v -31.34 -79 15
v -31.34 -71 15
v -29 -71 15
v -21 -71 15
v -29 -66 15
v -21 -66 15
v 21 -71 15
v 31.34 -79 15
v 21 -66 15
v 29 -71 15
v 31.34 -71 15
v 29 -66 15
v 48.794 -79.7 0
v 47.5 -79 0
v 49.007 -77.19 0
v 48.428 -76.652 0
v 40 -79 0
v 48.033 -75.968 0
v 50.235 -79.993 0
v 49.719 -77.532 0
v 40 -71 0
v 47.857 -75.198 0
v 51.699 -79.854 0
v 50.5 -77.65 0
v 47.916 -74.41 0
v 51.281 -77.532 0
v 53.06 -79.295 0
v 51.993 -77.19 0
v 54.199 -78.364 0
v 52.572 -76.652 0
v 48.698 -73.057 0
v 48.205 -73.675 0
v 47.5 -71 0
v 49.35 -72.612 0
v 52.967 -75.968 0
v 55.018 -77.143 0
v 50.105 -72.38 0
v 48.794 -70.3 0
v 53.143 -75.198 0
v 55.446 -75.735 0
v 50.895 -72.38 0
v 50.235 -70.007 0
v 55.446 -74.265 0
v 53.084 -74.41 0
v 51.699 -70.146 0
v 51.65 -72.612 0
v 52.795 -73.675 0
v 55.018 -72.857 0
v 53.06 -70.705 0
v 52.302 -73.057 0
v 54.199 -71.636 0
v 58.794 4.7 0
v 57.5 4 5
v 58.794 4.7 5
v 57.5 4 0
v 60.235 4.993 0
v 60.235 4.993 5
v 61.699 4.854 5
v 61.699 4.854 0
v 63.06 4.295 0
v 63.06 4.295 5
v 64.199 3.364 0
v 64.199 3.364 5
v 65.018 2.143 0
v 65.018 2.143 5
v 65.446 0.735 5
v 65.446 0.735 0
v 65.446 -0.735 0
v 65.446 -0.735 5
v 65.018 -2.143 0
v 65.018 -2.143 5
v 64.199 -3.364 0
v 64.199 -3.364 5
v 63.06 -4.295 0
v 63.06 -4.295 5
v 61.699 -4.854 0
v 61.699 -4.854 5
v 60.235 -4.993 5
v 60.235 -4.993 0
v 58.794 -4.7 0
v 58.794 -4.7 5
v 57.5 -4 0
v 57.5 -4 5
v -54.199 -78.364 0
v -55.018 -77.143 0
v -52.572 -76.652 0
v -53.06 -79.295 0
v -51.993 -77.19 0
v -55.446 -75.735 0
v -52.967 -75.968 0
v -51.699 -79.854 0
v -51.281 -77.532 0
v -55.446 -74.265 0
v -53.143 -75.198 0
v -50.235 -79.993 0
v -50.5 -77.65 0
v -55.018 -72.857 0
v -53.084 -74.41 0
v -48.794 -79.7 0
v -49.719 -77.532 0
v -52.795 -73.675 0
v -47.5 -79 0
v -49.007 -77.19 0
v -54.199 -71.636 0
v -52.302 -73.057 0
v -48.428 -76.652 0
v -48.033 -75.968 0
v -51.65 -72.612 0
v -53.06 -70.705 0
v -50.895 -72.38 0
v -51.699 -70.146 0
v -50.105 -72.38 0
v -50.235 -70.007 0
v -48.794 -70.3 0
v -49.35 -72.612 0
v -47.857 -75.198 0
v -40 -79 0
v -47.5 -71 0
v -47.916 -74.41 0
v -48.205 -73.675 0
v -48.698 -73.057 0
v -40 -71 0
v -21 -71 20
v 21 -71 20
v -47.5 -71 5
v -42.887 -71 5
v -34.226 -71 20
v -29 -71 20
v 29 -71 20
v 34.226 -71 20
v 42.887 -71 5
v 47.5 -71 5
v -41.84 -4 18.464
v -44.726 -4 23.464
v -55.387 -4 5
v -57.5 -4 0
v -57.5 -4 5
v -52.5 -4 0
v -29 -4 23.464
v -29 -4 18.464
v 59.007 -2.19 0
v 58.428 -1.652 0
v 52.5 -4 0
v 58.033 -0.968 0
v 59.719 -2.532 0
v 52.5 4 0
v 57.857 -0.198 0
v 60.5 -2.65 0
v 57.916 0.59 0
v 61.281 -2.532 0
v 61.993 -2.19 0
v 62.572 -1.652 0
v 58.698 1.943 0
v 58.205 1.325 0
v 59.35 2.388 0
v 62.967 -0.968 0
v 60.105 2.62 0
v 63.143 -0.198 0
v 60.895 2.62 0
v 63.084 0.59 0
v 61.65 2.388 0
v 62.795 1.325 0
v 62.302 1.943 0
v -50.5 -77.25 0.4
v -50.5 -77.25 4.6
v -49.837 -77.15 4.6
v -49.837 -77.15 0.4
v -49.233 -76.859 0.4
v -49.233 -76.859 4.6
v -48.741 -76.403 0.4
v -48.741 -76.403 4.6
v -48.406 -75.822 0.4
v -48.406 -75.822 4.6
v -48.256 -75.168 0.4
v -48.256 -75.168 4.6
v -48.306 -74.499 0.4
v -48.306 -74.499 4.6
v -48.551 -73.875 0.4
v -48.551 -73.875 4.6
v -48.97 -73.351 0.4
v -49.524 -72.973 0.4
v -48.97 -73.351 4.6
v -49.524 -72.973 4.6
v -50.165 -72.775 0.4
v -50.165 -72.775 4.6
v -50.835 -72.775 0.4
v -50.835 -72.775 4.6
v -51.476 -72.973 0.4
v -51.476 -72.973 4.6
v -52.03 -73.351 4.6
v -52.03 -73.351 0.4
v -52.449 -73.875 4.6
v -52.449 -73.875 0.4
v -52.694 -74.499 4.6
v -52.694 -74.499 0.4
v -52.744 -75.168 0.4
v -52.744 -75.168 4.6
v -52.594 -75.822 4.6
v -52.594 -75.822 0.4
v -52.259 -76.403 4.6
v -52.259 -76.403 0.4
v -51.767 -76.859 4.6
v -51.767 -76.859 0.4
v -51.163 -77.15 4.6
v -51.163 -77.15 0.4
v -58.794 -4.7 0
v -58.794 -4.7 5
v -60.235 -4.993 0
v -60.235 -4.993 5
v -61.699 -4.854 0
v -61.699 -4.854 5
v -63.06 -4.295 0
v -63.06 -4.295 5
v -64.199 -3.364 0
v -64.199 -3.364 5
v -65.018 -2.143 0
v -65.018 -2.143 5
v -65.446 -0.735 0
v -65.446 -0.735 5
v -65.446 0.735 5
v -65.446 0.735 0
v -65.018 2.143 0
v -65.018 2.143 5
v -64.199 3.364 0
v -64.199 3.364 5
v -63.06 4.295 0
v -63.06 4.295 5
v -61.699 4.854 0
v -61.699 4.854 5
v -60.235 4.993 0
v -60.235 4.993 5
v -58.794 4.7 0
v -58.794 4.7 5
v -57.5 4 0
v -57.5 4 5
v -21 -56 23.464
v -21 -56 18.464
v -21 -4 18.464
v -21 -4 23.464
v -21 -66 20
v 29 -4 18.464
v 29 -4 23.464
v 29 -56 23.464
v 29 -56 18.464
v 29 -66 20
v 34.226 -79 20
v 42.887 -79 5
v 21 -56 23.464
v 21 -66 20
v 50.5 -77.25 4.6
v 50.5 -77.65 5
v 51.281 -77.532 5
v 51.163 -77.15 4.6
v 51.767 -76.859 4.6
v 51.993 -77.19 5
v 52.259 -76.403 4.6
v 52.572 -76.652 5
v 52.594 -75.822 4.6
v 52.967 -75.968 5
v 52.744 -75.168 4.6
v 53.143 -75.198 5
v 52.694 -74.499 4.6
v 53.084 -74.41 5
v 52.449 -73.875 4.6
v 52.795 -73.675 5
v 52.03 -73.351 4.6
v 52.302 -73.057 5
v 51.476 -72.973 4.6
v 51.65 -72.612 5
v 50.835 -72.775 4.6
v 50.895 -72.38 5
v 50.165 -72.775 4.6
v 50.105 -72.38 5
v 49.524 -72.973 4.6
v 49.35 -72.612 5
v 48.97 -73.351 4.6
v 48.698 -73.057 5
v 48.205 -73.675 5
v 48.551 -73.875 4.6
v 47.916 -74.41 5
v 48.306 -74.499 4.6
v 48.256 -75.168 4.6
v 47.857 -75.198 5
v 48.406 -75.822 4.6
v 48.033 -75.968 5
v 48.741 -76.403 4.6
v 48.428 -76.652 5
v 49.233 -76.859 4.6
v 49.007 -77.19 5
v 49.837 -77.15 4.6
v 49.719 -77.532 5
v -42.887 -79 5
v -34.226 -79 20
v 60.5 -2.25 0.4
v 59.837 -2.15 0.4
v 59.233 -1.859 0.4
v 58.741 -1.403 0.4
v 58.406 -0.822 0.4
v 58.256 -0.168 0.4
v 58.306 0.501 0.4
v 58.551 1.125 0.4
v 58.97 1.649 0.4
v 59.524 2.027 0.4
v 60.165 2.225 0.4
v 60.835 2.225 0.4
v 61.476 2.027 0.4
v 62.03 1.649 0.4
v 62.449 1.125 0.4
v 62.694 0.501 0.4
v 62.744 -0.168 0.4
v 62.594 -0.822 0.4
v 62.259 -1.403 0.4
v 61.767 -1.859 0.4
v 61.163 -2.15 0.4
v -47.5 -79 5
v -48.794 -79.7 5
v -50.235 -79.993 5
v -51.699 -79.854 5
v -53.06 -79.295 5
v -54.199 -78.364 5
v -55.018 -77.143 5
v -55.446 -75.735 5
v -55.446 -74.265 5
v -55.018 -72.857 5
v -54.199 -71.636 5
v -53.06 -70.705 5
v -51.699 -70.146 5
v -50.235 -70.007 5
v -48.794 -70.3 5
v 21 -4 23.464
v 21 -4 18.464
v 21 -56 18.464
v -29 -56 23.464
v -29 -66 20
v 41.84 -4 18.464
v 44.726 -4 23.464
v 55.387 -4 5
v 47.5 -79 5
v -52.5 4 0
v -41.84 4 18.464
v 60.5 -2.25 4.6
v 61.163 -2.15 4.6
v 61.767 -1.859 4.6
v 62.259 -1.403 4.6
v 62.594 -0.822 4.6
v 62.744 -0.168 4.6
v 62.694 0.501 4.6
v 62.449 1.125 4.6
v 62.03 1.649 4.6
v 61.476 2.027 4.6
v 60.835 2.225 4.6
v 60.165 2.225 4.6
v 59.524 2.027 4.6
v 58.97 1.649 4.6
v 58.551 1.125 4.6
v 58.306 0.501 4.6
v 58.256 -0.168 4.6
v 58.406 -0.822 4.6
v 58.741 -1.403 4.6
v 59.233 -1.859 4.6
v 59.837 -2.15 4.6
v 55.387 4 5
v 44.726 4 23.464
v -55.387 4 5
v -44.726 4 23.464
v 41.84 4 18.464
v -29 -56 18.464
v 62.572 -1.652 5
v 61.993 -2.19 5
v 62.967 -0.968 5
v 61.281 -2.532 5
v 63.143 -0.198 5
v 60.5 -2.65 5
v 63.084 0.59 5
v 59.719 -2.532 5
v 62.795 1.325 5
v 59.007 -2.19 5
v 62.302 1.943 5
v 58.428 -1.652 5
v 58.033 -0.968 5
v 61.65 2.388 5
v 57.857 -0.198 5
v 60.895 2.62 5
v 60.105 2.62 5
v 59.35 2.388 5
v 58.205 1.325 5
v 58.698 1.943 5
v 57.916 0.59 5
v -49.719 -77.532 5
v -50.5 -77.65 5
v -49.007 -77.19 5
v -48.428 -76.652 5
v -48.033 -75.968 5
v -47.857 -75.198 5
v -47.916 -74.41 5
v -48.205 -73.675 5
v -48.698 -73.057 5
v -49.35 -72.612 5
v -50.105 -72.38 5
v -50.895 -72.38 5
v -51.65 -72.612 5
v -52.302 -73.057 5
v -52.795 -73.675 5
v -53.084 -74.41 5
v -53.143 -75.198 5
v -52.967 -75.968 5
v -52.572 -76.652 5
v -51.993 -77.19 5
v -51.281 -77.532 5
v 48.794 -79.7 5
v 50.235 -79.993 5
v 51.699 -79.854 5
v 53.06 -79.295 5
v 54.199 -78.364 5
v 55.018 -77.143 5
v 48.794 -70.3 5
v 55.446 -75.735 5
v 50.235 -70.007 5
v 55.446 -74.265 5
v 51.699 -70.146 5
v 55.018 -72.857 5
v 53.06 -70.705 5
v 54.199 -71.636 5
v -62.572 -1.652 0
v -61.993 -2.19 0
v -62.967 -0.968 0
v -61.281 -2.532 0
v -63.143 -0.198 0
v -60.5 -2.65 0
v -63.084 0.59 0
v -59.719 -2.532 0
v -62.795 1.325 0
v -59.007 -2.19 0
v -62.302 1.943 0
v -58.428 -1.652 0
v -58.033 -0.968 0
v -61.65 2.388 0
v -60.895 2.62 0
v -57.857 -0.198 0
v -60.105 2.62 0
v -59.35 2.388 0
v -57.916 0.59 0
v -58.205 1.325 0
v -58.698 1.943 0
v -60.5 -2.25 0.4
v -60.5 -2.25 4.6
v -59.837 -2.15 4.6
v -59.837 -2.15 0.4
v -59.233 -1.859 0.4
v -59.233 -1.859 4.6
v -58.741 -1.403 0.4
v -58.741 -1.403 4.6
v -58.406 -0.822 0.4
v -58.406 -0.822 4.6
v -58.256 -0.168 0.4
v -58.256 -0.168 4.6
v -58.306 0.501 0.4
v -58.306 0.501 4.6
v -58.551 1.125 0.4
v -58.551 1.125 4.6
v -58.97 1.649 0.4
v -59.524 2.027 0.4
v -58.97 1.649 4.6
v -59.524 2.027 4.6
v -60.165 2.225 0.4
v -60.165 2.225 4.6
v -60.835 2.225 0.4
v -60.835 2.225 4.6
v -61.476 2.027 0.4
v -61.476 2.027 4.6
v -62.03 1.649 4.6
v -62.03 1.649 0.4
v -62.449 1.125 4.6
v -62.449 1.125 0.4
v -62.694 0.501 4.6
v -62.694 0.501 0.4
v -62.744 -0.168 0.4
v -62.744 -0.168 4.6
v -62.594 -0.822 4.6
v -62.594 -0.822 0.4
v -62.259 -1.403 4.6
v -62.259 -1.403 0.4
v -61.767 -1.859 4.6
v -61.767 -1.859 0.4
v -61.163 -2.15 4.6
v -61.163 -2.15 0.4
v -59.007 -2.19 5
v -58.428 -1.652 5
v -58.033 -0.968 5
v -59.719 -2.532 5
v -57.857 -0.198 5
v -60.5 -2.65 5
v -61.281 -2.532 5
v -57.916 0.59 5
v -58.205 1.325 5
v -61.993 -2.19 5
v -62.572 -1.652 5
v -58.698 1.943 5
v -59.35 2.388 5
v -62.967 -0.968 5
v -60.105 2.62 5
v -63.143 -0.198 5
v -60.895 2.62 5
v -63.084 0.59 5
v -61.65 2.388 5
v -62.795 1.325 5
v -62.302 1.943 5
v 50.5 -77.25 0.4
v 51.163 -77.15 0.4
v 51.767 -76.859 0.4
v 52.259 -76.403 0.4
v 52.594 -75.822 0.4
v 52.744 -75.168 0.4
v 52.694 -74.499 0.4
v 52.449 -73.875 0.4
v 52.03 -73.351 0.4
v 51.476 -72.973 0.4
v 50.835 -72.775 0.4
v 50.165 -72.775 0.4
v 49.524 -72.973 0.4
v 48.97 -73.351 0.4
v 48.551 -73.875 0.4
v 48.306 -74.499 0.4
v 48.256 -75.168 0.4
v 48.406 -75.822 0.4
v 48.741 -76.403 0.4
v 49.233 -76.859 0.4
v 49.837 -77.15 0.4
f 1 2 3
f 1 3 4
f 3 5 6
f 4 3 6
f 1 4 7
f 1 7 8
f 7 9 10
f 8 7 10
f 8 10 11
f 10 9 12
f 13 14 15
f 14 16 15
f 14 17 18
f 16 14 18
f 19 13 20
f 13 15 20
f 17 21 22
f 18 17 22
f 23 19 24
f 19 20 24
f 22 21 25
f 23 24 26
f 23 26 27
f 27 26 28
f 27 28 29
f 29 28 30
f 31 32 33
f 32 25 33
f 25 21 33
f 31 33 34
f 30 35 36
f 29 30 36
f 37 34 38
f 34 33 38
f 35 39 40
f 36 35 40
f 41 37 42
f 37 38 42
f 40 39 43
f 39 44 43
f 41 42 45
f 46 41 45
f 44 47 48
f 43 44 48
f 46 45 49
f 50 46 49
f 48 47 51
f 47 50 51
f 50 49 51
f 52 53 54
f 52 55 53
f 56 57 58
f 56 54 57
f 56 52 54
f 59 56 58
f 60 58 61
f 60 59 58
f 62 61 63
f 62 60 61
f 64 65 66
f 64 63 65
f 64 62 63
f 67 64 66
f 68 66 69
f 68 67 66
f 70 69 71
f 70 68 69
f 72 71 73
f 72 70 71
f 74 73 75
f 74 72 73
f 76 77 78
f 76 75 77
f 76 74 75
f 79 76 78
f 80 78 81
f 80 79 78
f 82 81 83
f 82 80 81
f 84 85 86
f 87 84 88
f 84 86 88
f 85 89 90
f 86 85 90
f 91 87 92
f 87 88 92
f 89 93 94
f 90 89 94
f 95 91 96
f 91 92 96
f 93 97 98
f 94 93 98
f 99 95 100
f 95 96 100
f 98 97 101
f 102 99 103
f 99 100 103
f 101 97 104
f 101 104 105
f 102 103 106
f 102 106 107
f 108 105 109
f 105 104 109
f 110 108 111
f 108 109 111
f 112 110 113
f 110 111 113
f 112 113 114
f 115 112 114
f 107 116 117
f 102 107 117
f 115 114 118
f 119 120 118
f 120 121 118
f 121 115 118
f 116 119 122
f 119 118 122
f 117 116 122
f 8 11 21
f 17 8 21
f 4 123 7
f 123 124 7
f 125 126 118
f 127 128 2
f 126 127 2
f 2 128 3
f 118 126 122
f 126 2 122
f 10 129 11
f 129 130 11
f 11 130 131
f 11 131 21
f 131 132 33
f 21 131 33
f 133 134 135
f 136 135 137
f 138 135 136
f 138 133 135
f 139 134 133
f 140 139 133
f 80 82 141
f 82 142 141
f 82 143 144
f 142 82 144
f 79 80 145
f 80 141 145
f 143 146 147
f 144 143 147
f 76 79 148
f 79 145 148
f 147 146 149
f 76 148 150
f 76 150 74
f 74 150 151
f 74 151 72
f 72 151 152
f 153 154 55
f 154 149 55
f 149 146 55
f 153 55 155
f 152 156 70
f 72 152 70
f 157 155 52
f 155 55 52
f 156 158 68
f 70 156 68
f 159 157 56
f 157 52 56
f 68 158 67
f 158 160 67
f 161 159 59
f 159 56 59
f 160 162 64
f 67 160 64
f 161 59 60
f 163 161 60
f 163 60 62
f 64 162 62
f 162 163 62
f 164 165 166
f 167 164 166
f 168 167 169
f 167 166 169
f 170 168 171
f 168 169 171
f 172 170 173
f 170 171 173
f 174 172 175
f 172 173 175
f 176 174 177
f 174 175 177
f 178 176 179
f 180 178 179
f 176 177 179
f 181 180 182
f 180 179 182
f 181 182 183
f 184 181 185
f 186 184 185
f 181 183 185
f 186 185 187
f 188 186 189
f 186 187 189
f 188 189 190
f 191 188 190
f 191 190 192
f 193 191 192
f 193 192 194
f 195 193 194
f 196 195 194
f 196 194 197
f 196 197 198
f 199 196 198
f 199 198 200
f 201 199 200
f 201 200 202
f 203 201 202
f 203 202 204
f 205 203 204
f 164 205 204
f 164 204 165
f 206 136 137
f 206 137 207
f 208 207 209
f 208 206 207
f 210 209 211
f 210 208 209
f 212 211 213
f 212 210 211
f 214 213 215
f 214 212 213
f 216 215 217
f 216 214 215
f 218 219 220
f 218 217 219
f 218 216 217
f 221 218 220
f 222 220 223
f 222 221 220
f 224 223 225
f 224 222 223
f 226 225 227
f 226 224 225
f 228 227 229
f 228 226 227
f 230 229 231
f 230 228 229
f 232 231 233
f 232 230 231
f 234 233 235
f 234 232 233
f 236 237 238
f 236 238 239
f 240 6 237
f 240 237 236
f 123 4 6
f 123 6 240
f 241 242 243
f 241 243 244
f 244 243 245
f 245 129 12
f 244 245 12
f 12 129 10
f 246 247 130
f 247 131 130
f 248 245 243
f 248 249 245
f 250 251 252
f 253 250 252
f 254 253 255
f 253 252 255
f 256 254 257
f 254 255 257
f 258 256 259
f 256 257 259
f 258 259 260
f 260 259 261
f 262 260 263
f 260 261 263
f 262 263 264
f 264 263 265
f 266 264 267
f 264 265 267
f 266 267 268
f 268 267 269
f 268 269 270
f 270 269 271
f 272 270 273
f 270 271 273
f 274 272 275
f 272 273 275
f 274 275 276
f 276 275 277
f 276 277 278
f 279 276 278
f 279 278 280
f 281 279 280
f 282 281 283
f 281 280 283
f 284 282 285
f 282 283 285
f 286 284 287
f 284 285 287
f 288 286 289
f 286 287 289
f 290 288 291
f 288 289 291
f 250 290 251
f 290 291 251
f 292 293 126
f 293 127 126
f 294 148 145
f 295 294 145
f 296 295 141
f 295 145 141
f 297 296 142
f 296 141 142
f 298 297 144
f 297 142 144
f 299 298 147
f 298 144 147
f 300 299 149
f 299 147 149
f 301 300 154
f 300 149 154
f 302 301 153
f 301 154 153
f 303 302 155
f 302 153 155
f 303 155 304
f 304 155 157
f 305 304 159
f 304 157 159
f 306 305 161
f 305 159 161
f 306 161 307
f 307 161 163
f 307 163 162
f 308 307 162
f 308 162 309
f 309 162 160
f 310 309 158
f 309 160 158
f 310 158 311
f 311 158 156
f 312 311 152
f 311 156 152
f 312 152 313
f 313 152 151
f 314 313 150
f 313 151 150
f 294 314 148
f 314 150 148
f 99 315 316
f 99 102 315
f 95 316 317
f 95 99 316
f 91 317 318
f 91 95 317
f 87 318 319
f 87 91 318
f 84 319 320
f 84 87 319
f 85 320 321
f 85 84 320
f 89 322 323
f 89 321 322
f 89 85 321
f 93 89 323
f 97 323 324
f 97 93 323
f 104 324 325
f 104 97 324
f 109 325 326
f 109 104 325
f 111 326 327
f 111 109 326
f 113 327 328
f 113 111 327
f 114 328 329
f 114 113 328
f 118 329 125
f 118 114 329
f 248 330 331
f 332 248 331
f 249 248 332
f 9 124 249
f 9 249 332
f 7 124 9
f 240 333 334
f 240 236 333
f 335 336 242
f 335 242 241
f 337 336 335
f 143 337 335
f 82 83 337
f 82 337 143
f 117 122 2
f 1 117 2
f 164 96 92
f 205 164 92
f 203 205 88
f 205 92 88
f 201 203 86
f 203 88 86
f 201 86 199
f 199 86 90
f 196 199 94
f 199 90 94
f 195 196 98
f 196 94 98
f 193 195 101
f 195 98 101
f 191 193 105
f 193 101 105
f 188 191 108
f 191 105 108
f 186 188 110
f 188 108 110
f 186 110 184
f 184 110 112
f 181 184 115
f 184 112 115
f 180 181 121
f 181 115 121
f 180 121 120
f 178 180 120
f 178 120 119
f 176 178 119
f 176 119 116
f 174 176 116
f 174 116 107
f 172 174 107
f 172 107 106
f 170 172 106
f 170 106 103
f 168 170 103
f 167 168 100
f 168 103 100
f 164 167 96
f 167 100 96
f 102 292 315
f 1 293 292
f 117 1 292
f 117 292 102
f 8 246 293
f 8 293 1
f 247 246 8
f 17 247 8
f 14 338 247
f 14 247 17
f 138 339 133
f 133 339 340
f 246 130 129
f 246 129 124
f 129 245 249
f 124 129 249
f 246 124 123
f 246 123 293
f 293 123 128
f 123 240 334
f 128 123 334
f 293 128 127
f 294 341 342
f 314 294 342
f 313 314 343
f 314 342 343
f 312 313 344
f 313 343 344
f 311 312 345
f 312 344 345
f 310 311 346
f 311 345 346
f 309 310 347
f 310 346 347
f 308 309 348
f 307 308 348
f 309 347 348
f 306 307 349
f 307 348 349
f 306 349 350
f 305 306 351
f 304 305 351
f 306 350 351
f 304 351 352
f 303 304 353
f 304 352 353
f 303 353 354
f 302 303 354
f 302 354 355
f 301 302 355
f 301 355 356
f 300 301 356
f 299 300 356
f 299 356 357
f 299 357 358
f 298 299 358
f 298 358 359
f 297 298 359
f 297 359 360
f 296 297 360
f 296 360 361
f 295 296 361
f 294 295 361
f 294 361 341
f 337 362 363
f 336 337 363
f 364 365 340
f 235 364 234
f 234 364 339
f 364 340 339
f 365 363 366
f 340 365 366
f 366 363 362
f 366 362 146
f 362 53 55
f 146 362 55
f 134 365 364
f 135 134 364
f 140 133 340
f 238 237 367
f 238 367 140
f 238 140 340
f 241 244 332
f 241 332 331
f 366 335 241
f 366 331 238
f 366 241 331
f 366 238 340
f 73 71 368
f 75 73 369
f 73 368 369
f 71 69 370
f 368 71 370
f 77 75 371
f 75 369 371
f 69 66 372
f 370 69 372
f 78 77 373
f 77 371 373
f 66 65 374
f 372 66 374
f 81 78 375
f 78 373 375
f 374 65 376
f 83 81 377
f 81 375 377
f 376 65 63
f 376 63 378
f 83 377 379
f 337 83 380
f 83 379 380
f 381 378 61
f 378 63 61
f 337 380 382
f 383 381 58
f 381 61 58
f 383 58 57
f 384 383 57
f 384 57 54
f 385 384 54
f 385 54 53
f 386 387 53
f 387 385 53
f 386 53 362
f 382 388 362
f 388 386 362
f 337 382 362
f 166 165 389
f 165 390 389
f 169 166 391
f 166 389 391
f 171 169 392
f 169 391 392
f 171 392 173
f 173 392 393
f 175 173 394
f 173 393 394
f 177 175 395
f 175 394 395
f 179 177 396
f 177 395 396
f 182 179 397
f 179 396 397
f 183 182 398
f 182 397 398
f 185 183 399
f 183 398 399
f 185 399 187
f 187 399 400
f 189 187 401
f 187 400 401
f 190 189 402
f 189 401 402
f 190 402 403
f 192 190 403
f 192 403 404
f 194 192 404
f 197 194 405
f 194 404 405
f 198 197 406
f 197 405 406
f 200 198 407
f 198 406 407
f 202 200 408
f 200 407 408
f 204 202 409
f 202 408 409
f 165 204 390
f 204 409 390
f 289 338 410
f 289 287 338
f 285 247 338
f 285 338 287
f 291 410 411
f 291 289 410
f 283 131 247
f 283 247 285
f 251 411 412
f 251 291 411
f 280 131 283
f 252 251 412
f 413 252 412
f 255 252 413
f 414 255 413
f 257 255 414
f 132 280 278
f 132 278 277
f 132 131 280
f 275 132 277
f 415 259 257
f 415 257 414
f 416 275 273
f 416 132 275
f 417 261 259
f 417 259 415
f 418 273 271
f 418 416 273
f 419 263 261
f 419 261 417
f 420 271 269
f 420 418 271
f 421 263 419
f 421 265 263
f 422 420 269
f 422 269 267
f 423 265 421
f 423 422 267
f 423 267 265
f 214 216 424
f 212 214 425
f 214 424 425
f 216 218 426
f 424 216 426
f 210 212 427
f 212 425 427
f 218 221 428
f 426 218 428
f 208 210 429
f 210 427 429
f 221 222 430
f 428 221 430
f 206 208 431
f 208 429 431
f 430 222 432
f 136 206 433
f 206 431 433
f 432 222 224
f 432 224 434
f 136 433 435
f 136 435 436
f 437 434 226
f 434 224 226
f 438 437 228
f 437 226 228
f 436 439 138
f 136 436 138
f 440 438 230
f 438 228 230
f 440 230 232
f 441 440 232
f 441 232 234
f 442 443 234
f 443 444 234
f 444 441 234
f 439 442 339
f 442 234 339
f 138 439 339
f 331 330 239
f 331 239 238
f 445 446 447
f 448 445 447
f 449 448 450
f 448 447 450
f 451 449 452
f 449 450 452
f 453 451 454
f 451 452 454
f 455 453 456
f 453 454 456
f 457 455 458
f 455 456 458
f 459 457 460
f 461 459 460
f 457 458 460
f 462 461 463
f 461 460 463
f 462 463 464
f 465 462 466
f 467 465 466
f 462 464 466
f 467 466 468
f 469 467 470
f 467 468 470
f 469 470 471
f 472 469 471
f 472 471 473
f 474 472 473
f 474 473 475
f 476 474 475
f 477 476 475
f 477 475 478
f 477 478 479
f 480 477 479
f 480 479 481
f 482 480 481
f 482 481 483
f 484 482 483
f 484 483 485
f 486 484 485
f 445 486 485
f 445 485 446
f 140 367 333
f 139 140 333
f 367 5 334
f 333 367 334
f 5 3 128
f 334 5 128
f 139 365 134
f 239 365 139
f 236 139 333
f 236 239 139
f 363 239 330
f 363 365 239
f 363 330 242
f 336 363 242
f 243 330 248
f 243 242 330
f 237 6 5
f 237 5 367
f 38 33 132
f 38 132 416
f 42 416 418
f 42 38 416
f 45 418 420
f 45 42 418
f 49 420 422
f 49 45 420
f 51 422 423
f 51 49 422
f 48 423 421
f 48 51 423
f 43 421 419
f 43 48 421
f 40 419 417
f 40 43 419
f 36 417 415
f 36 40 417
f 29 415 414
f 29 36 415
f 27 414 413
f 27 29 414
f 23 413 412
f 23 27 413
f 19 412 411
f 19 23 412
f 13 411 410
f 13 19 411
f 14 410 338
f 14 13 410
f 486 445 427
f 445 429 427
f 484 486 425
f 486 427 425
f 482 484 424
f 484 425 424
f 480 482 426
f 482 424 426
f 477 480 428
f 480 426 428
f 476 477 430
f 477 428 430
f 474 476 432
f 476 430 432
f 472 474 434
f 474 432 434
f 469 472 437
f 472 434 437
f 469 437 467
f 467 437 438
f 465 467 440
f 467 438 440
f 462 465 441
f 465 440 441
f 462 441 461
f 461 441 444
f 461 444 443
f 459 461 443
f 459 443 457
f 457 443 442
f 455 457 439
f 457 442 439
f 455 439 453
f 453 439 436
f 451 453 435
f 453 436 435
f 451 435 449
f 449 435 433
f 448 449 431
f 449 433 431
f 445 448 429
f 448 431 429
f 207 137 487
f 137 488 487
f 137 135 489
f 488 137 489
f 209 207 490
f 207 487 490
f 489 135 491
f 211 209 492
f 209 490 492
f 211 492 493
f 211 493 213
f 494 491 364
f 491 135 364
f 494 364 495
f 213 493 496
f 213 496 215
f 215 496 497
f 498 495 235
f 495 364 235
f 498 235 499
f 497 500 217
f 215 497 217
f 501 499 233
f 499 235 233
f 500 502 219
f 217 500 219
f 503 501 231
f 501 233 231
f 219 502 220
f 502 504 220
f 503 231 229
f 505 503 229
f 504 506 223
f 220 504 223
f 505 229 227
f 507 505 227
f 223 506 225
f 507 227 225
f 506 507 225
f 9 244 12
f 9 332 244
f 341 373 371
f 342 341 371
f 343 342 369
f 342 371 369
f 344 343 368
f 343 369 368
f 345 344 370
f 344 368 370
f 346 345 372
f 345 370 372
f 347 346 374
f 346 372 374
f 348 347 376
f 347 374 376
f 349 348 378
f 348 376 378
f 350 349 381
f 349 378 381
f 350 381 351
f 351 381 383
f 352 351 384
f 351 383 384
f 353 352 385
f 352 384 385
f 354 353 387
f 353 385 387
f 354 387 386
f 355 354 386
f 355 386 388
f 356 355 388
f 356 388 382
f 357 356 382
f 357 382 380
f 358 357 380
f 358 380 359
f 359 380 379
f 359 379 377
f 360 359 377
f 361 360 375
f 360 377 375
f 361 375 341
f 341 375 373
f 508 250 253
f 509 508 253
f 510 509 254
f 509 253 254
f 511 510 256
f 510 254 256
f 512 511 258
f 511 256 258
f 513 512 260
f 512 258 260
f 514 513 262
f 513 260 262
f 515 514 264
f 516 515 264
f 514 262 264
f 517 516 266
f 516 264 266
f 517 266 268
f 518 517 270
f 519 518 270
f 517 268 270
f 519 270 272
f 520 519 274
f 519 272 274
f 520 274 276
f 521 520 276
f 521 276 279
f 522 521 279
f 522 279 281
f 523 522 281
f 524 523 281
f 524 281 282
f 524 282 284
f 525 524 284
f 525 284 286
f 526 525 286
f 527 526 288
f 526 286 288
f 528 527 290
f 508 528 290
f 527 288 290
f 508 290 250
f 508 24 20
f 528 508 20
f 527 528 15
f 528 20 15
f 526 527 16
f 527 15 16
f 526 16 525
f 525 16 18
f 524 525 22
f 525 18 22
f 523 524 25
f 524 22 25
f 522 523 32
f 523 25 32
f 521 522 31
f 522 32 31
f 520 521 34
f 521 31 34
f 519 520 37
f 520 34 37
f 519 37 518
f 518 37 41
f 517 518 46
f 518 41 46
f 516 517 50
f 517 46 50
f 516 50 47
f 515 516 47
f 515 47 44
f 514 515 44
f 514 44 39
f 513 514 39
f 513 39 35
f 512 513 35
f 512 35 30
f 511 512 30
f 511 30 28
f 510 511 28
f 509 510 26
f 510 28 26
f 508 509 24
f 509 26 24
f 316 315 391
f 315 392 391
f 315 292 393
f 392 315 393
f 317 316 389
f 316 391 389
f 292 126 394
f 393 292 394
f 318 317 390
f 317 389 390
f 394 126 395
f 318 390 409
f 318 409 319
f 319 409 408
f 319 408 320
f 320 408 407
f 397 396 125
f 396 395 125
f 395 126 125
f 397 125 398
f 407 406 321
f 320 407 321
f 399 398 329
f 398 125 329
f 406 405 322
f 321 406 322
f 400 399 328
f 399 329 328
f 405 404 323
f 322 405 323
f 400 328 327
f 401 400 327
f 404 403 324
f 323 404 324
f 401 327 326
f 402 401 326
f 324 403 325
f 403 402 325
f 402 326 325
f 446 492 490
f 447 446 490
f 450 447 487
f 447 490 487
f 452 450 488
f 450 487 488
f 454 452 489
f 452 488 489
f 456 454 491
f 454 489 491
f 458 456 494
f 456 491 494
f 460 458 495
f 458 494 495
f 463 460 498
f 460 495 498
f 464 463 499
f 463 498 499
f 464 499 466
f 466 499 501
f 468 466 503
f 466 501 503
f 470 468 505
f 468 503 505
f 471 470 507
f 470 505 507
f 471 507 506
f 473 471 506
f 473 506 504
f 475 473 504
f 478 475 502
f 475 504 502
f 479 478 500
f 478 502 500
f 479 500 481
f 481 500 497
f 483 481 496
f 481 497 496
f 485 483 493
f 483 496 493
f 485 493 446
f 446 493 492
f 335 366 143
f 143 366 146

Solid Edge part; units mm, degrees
sketch "Sketch1" plane through (0, 0, 0) normal (0, 0, 1) x (1, 0, 0)
  circle A0 centre (-60.5, 0) radius 5
  circle A1 centre (60.5, 0) radius 5
  circle A2 centre (50.5, -75) radius 5
  circle A3 centre (-50.5, -75) radius 5
  dimension "D1" = 10
  dimension "D2" = 10
extrude "Protrusion1" add sketch "Sketch1" along normal blind 5
sketch "Sketch2" plane through (0, 0, 0) normal (0, -1, 0) x (1, 0, 0)
  line L0 (-60.5, 0) -> (-52.5, 0)
  line L1 (-52.5, 0) -> (-41.8397, 18.4641)
  line L2 (-41.8397, 18.4641) -> (41.8397, 18.4641)
  line L3 (41.8397, 18.4641) -> (52.5, 0)
  line L4 (52.5, 0) -> (60.5, 0)
  line L5 (60.5, 5) -> (60.5, 0)
  line L6 (60.5, 5) -> (55.3868, 5)
  line L7 (55.3868, 5) -> (44.7265, 23.4641)
  line L8 (44.7265, 23.4641) -> (-44.7265, 23.4641)
  line L9 (-44.7265, 23.4641) -> (-55.3868, 5)
  line L10 (-55.3868, 5) -> (-60.5, 5)
  line L11 (-60.5, 5) -> (-60.5, 0)
  dimension "D1" = 5
  dimension "D2" = 105
  dimension "D3" = 5
extrude "larger_bow" add sketch "Sketch2" along normal mid plane 8
sketch "Sketch3" plane through (0, -75, 0) normal (0, -1, 0) x (1, 0, 0)
  line L0 (-50.5, 5) -> (-50.5, 0)
  line L1 (-50.5, 0) -> (-40, 0)
  line L2 (-40, 0) -> (-31.3397, 15)
  line L3 (-31.3397, 15) -> (31.3397, 15)
  line L4 (31.3397, 15) -> (40, 0)
  line L5 (40, 0) -> (50.5, 0)
  line L6 (50.5, 0) -> (50.5, 5)
  line L7 (50.5, 5) -> (42.8868, 5)
  line L8 (42.8868, 5) -> (34.2265, 20)
  line L9 (34.2265, 20) -> (-34.2265, 20)
  line L10 (-34.2265, 20) -> (-42.8868, 5)
  line L11 (-42.8868, 5) -> (-50.5, 5)
  dimension "D1" = 5
  dimension "D2" = 5
  dimension "D3" = 80
  dimension "D4" = 20
extrude "smaller_bow" add sketch "Sketch3" along normal mid plane 8
hole "Hole1" at (60.5, 0, 5) direction (0, 0, -1) diameter 4.5 end up to next start chamfer 0.4 start chamfer angle 45 end chamfer 0.4 end chamfer angle 45
hole "Hole2" at (50.5, -75, 5) direction (0, 0, -1) diameter 4.5 end up to next start chamfer 0.4 start chamfer angle 45 end chamfer 0.4 end chamfer angle 45
hole "Hole3" at (-50.5, -75, 5) direction (0, 0, -1) diameter 4.5 end up to next start chamfer 0.4 start chamfer angle 45 end chamfer 0.4 end chamfer angle 45
hole "Hole4" at (-60.5, 0, 5) direction (0, 0, -1) diameter 4.5 end up to next start chamfer 0.4 start chamfer angle 45 end chamfer 0.4 end chamfer angle 45
sketch "Sketch4" plane through (25, 0, 0) normal (1, 0, 0) x (0, 1, 0)
  line L0 (-71, 20) -> (-66, 20)
  line L1 (-66, 20) -> (-56, 23.4641)
  line L2 (-56, 23.4641) -> (-4, 23.4641)
  line L3 (-4, 23.4641) -> (-4, 18.4641)
  line L4 (-4, 18.4641) -> (-56, 18.4641)
  line L5 (-56, 18.4641) -> (-66, 15)
  line L6 (-66, 15) -> (-71, 15)
  line L7 (-71, 15) -> (-71, 20)
  dimension "D1" = 5
  dimension "D2" = 10
extrude "ExtrudedProtrusion_4" add sketch "Sketch4" along normal mid plane 8
mirror "Mirror1" about plane through (0, 0, 0) normal (1, 0, 0) of "ExtrudedProtrusion_4"
properties material "Polyethylene, low density"
